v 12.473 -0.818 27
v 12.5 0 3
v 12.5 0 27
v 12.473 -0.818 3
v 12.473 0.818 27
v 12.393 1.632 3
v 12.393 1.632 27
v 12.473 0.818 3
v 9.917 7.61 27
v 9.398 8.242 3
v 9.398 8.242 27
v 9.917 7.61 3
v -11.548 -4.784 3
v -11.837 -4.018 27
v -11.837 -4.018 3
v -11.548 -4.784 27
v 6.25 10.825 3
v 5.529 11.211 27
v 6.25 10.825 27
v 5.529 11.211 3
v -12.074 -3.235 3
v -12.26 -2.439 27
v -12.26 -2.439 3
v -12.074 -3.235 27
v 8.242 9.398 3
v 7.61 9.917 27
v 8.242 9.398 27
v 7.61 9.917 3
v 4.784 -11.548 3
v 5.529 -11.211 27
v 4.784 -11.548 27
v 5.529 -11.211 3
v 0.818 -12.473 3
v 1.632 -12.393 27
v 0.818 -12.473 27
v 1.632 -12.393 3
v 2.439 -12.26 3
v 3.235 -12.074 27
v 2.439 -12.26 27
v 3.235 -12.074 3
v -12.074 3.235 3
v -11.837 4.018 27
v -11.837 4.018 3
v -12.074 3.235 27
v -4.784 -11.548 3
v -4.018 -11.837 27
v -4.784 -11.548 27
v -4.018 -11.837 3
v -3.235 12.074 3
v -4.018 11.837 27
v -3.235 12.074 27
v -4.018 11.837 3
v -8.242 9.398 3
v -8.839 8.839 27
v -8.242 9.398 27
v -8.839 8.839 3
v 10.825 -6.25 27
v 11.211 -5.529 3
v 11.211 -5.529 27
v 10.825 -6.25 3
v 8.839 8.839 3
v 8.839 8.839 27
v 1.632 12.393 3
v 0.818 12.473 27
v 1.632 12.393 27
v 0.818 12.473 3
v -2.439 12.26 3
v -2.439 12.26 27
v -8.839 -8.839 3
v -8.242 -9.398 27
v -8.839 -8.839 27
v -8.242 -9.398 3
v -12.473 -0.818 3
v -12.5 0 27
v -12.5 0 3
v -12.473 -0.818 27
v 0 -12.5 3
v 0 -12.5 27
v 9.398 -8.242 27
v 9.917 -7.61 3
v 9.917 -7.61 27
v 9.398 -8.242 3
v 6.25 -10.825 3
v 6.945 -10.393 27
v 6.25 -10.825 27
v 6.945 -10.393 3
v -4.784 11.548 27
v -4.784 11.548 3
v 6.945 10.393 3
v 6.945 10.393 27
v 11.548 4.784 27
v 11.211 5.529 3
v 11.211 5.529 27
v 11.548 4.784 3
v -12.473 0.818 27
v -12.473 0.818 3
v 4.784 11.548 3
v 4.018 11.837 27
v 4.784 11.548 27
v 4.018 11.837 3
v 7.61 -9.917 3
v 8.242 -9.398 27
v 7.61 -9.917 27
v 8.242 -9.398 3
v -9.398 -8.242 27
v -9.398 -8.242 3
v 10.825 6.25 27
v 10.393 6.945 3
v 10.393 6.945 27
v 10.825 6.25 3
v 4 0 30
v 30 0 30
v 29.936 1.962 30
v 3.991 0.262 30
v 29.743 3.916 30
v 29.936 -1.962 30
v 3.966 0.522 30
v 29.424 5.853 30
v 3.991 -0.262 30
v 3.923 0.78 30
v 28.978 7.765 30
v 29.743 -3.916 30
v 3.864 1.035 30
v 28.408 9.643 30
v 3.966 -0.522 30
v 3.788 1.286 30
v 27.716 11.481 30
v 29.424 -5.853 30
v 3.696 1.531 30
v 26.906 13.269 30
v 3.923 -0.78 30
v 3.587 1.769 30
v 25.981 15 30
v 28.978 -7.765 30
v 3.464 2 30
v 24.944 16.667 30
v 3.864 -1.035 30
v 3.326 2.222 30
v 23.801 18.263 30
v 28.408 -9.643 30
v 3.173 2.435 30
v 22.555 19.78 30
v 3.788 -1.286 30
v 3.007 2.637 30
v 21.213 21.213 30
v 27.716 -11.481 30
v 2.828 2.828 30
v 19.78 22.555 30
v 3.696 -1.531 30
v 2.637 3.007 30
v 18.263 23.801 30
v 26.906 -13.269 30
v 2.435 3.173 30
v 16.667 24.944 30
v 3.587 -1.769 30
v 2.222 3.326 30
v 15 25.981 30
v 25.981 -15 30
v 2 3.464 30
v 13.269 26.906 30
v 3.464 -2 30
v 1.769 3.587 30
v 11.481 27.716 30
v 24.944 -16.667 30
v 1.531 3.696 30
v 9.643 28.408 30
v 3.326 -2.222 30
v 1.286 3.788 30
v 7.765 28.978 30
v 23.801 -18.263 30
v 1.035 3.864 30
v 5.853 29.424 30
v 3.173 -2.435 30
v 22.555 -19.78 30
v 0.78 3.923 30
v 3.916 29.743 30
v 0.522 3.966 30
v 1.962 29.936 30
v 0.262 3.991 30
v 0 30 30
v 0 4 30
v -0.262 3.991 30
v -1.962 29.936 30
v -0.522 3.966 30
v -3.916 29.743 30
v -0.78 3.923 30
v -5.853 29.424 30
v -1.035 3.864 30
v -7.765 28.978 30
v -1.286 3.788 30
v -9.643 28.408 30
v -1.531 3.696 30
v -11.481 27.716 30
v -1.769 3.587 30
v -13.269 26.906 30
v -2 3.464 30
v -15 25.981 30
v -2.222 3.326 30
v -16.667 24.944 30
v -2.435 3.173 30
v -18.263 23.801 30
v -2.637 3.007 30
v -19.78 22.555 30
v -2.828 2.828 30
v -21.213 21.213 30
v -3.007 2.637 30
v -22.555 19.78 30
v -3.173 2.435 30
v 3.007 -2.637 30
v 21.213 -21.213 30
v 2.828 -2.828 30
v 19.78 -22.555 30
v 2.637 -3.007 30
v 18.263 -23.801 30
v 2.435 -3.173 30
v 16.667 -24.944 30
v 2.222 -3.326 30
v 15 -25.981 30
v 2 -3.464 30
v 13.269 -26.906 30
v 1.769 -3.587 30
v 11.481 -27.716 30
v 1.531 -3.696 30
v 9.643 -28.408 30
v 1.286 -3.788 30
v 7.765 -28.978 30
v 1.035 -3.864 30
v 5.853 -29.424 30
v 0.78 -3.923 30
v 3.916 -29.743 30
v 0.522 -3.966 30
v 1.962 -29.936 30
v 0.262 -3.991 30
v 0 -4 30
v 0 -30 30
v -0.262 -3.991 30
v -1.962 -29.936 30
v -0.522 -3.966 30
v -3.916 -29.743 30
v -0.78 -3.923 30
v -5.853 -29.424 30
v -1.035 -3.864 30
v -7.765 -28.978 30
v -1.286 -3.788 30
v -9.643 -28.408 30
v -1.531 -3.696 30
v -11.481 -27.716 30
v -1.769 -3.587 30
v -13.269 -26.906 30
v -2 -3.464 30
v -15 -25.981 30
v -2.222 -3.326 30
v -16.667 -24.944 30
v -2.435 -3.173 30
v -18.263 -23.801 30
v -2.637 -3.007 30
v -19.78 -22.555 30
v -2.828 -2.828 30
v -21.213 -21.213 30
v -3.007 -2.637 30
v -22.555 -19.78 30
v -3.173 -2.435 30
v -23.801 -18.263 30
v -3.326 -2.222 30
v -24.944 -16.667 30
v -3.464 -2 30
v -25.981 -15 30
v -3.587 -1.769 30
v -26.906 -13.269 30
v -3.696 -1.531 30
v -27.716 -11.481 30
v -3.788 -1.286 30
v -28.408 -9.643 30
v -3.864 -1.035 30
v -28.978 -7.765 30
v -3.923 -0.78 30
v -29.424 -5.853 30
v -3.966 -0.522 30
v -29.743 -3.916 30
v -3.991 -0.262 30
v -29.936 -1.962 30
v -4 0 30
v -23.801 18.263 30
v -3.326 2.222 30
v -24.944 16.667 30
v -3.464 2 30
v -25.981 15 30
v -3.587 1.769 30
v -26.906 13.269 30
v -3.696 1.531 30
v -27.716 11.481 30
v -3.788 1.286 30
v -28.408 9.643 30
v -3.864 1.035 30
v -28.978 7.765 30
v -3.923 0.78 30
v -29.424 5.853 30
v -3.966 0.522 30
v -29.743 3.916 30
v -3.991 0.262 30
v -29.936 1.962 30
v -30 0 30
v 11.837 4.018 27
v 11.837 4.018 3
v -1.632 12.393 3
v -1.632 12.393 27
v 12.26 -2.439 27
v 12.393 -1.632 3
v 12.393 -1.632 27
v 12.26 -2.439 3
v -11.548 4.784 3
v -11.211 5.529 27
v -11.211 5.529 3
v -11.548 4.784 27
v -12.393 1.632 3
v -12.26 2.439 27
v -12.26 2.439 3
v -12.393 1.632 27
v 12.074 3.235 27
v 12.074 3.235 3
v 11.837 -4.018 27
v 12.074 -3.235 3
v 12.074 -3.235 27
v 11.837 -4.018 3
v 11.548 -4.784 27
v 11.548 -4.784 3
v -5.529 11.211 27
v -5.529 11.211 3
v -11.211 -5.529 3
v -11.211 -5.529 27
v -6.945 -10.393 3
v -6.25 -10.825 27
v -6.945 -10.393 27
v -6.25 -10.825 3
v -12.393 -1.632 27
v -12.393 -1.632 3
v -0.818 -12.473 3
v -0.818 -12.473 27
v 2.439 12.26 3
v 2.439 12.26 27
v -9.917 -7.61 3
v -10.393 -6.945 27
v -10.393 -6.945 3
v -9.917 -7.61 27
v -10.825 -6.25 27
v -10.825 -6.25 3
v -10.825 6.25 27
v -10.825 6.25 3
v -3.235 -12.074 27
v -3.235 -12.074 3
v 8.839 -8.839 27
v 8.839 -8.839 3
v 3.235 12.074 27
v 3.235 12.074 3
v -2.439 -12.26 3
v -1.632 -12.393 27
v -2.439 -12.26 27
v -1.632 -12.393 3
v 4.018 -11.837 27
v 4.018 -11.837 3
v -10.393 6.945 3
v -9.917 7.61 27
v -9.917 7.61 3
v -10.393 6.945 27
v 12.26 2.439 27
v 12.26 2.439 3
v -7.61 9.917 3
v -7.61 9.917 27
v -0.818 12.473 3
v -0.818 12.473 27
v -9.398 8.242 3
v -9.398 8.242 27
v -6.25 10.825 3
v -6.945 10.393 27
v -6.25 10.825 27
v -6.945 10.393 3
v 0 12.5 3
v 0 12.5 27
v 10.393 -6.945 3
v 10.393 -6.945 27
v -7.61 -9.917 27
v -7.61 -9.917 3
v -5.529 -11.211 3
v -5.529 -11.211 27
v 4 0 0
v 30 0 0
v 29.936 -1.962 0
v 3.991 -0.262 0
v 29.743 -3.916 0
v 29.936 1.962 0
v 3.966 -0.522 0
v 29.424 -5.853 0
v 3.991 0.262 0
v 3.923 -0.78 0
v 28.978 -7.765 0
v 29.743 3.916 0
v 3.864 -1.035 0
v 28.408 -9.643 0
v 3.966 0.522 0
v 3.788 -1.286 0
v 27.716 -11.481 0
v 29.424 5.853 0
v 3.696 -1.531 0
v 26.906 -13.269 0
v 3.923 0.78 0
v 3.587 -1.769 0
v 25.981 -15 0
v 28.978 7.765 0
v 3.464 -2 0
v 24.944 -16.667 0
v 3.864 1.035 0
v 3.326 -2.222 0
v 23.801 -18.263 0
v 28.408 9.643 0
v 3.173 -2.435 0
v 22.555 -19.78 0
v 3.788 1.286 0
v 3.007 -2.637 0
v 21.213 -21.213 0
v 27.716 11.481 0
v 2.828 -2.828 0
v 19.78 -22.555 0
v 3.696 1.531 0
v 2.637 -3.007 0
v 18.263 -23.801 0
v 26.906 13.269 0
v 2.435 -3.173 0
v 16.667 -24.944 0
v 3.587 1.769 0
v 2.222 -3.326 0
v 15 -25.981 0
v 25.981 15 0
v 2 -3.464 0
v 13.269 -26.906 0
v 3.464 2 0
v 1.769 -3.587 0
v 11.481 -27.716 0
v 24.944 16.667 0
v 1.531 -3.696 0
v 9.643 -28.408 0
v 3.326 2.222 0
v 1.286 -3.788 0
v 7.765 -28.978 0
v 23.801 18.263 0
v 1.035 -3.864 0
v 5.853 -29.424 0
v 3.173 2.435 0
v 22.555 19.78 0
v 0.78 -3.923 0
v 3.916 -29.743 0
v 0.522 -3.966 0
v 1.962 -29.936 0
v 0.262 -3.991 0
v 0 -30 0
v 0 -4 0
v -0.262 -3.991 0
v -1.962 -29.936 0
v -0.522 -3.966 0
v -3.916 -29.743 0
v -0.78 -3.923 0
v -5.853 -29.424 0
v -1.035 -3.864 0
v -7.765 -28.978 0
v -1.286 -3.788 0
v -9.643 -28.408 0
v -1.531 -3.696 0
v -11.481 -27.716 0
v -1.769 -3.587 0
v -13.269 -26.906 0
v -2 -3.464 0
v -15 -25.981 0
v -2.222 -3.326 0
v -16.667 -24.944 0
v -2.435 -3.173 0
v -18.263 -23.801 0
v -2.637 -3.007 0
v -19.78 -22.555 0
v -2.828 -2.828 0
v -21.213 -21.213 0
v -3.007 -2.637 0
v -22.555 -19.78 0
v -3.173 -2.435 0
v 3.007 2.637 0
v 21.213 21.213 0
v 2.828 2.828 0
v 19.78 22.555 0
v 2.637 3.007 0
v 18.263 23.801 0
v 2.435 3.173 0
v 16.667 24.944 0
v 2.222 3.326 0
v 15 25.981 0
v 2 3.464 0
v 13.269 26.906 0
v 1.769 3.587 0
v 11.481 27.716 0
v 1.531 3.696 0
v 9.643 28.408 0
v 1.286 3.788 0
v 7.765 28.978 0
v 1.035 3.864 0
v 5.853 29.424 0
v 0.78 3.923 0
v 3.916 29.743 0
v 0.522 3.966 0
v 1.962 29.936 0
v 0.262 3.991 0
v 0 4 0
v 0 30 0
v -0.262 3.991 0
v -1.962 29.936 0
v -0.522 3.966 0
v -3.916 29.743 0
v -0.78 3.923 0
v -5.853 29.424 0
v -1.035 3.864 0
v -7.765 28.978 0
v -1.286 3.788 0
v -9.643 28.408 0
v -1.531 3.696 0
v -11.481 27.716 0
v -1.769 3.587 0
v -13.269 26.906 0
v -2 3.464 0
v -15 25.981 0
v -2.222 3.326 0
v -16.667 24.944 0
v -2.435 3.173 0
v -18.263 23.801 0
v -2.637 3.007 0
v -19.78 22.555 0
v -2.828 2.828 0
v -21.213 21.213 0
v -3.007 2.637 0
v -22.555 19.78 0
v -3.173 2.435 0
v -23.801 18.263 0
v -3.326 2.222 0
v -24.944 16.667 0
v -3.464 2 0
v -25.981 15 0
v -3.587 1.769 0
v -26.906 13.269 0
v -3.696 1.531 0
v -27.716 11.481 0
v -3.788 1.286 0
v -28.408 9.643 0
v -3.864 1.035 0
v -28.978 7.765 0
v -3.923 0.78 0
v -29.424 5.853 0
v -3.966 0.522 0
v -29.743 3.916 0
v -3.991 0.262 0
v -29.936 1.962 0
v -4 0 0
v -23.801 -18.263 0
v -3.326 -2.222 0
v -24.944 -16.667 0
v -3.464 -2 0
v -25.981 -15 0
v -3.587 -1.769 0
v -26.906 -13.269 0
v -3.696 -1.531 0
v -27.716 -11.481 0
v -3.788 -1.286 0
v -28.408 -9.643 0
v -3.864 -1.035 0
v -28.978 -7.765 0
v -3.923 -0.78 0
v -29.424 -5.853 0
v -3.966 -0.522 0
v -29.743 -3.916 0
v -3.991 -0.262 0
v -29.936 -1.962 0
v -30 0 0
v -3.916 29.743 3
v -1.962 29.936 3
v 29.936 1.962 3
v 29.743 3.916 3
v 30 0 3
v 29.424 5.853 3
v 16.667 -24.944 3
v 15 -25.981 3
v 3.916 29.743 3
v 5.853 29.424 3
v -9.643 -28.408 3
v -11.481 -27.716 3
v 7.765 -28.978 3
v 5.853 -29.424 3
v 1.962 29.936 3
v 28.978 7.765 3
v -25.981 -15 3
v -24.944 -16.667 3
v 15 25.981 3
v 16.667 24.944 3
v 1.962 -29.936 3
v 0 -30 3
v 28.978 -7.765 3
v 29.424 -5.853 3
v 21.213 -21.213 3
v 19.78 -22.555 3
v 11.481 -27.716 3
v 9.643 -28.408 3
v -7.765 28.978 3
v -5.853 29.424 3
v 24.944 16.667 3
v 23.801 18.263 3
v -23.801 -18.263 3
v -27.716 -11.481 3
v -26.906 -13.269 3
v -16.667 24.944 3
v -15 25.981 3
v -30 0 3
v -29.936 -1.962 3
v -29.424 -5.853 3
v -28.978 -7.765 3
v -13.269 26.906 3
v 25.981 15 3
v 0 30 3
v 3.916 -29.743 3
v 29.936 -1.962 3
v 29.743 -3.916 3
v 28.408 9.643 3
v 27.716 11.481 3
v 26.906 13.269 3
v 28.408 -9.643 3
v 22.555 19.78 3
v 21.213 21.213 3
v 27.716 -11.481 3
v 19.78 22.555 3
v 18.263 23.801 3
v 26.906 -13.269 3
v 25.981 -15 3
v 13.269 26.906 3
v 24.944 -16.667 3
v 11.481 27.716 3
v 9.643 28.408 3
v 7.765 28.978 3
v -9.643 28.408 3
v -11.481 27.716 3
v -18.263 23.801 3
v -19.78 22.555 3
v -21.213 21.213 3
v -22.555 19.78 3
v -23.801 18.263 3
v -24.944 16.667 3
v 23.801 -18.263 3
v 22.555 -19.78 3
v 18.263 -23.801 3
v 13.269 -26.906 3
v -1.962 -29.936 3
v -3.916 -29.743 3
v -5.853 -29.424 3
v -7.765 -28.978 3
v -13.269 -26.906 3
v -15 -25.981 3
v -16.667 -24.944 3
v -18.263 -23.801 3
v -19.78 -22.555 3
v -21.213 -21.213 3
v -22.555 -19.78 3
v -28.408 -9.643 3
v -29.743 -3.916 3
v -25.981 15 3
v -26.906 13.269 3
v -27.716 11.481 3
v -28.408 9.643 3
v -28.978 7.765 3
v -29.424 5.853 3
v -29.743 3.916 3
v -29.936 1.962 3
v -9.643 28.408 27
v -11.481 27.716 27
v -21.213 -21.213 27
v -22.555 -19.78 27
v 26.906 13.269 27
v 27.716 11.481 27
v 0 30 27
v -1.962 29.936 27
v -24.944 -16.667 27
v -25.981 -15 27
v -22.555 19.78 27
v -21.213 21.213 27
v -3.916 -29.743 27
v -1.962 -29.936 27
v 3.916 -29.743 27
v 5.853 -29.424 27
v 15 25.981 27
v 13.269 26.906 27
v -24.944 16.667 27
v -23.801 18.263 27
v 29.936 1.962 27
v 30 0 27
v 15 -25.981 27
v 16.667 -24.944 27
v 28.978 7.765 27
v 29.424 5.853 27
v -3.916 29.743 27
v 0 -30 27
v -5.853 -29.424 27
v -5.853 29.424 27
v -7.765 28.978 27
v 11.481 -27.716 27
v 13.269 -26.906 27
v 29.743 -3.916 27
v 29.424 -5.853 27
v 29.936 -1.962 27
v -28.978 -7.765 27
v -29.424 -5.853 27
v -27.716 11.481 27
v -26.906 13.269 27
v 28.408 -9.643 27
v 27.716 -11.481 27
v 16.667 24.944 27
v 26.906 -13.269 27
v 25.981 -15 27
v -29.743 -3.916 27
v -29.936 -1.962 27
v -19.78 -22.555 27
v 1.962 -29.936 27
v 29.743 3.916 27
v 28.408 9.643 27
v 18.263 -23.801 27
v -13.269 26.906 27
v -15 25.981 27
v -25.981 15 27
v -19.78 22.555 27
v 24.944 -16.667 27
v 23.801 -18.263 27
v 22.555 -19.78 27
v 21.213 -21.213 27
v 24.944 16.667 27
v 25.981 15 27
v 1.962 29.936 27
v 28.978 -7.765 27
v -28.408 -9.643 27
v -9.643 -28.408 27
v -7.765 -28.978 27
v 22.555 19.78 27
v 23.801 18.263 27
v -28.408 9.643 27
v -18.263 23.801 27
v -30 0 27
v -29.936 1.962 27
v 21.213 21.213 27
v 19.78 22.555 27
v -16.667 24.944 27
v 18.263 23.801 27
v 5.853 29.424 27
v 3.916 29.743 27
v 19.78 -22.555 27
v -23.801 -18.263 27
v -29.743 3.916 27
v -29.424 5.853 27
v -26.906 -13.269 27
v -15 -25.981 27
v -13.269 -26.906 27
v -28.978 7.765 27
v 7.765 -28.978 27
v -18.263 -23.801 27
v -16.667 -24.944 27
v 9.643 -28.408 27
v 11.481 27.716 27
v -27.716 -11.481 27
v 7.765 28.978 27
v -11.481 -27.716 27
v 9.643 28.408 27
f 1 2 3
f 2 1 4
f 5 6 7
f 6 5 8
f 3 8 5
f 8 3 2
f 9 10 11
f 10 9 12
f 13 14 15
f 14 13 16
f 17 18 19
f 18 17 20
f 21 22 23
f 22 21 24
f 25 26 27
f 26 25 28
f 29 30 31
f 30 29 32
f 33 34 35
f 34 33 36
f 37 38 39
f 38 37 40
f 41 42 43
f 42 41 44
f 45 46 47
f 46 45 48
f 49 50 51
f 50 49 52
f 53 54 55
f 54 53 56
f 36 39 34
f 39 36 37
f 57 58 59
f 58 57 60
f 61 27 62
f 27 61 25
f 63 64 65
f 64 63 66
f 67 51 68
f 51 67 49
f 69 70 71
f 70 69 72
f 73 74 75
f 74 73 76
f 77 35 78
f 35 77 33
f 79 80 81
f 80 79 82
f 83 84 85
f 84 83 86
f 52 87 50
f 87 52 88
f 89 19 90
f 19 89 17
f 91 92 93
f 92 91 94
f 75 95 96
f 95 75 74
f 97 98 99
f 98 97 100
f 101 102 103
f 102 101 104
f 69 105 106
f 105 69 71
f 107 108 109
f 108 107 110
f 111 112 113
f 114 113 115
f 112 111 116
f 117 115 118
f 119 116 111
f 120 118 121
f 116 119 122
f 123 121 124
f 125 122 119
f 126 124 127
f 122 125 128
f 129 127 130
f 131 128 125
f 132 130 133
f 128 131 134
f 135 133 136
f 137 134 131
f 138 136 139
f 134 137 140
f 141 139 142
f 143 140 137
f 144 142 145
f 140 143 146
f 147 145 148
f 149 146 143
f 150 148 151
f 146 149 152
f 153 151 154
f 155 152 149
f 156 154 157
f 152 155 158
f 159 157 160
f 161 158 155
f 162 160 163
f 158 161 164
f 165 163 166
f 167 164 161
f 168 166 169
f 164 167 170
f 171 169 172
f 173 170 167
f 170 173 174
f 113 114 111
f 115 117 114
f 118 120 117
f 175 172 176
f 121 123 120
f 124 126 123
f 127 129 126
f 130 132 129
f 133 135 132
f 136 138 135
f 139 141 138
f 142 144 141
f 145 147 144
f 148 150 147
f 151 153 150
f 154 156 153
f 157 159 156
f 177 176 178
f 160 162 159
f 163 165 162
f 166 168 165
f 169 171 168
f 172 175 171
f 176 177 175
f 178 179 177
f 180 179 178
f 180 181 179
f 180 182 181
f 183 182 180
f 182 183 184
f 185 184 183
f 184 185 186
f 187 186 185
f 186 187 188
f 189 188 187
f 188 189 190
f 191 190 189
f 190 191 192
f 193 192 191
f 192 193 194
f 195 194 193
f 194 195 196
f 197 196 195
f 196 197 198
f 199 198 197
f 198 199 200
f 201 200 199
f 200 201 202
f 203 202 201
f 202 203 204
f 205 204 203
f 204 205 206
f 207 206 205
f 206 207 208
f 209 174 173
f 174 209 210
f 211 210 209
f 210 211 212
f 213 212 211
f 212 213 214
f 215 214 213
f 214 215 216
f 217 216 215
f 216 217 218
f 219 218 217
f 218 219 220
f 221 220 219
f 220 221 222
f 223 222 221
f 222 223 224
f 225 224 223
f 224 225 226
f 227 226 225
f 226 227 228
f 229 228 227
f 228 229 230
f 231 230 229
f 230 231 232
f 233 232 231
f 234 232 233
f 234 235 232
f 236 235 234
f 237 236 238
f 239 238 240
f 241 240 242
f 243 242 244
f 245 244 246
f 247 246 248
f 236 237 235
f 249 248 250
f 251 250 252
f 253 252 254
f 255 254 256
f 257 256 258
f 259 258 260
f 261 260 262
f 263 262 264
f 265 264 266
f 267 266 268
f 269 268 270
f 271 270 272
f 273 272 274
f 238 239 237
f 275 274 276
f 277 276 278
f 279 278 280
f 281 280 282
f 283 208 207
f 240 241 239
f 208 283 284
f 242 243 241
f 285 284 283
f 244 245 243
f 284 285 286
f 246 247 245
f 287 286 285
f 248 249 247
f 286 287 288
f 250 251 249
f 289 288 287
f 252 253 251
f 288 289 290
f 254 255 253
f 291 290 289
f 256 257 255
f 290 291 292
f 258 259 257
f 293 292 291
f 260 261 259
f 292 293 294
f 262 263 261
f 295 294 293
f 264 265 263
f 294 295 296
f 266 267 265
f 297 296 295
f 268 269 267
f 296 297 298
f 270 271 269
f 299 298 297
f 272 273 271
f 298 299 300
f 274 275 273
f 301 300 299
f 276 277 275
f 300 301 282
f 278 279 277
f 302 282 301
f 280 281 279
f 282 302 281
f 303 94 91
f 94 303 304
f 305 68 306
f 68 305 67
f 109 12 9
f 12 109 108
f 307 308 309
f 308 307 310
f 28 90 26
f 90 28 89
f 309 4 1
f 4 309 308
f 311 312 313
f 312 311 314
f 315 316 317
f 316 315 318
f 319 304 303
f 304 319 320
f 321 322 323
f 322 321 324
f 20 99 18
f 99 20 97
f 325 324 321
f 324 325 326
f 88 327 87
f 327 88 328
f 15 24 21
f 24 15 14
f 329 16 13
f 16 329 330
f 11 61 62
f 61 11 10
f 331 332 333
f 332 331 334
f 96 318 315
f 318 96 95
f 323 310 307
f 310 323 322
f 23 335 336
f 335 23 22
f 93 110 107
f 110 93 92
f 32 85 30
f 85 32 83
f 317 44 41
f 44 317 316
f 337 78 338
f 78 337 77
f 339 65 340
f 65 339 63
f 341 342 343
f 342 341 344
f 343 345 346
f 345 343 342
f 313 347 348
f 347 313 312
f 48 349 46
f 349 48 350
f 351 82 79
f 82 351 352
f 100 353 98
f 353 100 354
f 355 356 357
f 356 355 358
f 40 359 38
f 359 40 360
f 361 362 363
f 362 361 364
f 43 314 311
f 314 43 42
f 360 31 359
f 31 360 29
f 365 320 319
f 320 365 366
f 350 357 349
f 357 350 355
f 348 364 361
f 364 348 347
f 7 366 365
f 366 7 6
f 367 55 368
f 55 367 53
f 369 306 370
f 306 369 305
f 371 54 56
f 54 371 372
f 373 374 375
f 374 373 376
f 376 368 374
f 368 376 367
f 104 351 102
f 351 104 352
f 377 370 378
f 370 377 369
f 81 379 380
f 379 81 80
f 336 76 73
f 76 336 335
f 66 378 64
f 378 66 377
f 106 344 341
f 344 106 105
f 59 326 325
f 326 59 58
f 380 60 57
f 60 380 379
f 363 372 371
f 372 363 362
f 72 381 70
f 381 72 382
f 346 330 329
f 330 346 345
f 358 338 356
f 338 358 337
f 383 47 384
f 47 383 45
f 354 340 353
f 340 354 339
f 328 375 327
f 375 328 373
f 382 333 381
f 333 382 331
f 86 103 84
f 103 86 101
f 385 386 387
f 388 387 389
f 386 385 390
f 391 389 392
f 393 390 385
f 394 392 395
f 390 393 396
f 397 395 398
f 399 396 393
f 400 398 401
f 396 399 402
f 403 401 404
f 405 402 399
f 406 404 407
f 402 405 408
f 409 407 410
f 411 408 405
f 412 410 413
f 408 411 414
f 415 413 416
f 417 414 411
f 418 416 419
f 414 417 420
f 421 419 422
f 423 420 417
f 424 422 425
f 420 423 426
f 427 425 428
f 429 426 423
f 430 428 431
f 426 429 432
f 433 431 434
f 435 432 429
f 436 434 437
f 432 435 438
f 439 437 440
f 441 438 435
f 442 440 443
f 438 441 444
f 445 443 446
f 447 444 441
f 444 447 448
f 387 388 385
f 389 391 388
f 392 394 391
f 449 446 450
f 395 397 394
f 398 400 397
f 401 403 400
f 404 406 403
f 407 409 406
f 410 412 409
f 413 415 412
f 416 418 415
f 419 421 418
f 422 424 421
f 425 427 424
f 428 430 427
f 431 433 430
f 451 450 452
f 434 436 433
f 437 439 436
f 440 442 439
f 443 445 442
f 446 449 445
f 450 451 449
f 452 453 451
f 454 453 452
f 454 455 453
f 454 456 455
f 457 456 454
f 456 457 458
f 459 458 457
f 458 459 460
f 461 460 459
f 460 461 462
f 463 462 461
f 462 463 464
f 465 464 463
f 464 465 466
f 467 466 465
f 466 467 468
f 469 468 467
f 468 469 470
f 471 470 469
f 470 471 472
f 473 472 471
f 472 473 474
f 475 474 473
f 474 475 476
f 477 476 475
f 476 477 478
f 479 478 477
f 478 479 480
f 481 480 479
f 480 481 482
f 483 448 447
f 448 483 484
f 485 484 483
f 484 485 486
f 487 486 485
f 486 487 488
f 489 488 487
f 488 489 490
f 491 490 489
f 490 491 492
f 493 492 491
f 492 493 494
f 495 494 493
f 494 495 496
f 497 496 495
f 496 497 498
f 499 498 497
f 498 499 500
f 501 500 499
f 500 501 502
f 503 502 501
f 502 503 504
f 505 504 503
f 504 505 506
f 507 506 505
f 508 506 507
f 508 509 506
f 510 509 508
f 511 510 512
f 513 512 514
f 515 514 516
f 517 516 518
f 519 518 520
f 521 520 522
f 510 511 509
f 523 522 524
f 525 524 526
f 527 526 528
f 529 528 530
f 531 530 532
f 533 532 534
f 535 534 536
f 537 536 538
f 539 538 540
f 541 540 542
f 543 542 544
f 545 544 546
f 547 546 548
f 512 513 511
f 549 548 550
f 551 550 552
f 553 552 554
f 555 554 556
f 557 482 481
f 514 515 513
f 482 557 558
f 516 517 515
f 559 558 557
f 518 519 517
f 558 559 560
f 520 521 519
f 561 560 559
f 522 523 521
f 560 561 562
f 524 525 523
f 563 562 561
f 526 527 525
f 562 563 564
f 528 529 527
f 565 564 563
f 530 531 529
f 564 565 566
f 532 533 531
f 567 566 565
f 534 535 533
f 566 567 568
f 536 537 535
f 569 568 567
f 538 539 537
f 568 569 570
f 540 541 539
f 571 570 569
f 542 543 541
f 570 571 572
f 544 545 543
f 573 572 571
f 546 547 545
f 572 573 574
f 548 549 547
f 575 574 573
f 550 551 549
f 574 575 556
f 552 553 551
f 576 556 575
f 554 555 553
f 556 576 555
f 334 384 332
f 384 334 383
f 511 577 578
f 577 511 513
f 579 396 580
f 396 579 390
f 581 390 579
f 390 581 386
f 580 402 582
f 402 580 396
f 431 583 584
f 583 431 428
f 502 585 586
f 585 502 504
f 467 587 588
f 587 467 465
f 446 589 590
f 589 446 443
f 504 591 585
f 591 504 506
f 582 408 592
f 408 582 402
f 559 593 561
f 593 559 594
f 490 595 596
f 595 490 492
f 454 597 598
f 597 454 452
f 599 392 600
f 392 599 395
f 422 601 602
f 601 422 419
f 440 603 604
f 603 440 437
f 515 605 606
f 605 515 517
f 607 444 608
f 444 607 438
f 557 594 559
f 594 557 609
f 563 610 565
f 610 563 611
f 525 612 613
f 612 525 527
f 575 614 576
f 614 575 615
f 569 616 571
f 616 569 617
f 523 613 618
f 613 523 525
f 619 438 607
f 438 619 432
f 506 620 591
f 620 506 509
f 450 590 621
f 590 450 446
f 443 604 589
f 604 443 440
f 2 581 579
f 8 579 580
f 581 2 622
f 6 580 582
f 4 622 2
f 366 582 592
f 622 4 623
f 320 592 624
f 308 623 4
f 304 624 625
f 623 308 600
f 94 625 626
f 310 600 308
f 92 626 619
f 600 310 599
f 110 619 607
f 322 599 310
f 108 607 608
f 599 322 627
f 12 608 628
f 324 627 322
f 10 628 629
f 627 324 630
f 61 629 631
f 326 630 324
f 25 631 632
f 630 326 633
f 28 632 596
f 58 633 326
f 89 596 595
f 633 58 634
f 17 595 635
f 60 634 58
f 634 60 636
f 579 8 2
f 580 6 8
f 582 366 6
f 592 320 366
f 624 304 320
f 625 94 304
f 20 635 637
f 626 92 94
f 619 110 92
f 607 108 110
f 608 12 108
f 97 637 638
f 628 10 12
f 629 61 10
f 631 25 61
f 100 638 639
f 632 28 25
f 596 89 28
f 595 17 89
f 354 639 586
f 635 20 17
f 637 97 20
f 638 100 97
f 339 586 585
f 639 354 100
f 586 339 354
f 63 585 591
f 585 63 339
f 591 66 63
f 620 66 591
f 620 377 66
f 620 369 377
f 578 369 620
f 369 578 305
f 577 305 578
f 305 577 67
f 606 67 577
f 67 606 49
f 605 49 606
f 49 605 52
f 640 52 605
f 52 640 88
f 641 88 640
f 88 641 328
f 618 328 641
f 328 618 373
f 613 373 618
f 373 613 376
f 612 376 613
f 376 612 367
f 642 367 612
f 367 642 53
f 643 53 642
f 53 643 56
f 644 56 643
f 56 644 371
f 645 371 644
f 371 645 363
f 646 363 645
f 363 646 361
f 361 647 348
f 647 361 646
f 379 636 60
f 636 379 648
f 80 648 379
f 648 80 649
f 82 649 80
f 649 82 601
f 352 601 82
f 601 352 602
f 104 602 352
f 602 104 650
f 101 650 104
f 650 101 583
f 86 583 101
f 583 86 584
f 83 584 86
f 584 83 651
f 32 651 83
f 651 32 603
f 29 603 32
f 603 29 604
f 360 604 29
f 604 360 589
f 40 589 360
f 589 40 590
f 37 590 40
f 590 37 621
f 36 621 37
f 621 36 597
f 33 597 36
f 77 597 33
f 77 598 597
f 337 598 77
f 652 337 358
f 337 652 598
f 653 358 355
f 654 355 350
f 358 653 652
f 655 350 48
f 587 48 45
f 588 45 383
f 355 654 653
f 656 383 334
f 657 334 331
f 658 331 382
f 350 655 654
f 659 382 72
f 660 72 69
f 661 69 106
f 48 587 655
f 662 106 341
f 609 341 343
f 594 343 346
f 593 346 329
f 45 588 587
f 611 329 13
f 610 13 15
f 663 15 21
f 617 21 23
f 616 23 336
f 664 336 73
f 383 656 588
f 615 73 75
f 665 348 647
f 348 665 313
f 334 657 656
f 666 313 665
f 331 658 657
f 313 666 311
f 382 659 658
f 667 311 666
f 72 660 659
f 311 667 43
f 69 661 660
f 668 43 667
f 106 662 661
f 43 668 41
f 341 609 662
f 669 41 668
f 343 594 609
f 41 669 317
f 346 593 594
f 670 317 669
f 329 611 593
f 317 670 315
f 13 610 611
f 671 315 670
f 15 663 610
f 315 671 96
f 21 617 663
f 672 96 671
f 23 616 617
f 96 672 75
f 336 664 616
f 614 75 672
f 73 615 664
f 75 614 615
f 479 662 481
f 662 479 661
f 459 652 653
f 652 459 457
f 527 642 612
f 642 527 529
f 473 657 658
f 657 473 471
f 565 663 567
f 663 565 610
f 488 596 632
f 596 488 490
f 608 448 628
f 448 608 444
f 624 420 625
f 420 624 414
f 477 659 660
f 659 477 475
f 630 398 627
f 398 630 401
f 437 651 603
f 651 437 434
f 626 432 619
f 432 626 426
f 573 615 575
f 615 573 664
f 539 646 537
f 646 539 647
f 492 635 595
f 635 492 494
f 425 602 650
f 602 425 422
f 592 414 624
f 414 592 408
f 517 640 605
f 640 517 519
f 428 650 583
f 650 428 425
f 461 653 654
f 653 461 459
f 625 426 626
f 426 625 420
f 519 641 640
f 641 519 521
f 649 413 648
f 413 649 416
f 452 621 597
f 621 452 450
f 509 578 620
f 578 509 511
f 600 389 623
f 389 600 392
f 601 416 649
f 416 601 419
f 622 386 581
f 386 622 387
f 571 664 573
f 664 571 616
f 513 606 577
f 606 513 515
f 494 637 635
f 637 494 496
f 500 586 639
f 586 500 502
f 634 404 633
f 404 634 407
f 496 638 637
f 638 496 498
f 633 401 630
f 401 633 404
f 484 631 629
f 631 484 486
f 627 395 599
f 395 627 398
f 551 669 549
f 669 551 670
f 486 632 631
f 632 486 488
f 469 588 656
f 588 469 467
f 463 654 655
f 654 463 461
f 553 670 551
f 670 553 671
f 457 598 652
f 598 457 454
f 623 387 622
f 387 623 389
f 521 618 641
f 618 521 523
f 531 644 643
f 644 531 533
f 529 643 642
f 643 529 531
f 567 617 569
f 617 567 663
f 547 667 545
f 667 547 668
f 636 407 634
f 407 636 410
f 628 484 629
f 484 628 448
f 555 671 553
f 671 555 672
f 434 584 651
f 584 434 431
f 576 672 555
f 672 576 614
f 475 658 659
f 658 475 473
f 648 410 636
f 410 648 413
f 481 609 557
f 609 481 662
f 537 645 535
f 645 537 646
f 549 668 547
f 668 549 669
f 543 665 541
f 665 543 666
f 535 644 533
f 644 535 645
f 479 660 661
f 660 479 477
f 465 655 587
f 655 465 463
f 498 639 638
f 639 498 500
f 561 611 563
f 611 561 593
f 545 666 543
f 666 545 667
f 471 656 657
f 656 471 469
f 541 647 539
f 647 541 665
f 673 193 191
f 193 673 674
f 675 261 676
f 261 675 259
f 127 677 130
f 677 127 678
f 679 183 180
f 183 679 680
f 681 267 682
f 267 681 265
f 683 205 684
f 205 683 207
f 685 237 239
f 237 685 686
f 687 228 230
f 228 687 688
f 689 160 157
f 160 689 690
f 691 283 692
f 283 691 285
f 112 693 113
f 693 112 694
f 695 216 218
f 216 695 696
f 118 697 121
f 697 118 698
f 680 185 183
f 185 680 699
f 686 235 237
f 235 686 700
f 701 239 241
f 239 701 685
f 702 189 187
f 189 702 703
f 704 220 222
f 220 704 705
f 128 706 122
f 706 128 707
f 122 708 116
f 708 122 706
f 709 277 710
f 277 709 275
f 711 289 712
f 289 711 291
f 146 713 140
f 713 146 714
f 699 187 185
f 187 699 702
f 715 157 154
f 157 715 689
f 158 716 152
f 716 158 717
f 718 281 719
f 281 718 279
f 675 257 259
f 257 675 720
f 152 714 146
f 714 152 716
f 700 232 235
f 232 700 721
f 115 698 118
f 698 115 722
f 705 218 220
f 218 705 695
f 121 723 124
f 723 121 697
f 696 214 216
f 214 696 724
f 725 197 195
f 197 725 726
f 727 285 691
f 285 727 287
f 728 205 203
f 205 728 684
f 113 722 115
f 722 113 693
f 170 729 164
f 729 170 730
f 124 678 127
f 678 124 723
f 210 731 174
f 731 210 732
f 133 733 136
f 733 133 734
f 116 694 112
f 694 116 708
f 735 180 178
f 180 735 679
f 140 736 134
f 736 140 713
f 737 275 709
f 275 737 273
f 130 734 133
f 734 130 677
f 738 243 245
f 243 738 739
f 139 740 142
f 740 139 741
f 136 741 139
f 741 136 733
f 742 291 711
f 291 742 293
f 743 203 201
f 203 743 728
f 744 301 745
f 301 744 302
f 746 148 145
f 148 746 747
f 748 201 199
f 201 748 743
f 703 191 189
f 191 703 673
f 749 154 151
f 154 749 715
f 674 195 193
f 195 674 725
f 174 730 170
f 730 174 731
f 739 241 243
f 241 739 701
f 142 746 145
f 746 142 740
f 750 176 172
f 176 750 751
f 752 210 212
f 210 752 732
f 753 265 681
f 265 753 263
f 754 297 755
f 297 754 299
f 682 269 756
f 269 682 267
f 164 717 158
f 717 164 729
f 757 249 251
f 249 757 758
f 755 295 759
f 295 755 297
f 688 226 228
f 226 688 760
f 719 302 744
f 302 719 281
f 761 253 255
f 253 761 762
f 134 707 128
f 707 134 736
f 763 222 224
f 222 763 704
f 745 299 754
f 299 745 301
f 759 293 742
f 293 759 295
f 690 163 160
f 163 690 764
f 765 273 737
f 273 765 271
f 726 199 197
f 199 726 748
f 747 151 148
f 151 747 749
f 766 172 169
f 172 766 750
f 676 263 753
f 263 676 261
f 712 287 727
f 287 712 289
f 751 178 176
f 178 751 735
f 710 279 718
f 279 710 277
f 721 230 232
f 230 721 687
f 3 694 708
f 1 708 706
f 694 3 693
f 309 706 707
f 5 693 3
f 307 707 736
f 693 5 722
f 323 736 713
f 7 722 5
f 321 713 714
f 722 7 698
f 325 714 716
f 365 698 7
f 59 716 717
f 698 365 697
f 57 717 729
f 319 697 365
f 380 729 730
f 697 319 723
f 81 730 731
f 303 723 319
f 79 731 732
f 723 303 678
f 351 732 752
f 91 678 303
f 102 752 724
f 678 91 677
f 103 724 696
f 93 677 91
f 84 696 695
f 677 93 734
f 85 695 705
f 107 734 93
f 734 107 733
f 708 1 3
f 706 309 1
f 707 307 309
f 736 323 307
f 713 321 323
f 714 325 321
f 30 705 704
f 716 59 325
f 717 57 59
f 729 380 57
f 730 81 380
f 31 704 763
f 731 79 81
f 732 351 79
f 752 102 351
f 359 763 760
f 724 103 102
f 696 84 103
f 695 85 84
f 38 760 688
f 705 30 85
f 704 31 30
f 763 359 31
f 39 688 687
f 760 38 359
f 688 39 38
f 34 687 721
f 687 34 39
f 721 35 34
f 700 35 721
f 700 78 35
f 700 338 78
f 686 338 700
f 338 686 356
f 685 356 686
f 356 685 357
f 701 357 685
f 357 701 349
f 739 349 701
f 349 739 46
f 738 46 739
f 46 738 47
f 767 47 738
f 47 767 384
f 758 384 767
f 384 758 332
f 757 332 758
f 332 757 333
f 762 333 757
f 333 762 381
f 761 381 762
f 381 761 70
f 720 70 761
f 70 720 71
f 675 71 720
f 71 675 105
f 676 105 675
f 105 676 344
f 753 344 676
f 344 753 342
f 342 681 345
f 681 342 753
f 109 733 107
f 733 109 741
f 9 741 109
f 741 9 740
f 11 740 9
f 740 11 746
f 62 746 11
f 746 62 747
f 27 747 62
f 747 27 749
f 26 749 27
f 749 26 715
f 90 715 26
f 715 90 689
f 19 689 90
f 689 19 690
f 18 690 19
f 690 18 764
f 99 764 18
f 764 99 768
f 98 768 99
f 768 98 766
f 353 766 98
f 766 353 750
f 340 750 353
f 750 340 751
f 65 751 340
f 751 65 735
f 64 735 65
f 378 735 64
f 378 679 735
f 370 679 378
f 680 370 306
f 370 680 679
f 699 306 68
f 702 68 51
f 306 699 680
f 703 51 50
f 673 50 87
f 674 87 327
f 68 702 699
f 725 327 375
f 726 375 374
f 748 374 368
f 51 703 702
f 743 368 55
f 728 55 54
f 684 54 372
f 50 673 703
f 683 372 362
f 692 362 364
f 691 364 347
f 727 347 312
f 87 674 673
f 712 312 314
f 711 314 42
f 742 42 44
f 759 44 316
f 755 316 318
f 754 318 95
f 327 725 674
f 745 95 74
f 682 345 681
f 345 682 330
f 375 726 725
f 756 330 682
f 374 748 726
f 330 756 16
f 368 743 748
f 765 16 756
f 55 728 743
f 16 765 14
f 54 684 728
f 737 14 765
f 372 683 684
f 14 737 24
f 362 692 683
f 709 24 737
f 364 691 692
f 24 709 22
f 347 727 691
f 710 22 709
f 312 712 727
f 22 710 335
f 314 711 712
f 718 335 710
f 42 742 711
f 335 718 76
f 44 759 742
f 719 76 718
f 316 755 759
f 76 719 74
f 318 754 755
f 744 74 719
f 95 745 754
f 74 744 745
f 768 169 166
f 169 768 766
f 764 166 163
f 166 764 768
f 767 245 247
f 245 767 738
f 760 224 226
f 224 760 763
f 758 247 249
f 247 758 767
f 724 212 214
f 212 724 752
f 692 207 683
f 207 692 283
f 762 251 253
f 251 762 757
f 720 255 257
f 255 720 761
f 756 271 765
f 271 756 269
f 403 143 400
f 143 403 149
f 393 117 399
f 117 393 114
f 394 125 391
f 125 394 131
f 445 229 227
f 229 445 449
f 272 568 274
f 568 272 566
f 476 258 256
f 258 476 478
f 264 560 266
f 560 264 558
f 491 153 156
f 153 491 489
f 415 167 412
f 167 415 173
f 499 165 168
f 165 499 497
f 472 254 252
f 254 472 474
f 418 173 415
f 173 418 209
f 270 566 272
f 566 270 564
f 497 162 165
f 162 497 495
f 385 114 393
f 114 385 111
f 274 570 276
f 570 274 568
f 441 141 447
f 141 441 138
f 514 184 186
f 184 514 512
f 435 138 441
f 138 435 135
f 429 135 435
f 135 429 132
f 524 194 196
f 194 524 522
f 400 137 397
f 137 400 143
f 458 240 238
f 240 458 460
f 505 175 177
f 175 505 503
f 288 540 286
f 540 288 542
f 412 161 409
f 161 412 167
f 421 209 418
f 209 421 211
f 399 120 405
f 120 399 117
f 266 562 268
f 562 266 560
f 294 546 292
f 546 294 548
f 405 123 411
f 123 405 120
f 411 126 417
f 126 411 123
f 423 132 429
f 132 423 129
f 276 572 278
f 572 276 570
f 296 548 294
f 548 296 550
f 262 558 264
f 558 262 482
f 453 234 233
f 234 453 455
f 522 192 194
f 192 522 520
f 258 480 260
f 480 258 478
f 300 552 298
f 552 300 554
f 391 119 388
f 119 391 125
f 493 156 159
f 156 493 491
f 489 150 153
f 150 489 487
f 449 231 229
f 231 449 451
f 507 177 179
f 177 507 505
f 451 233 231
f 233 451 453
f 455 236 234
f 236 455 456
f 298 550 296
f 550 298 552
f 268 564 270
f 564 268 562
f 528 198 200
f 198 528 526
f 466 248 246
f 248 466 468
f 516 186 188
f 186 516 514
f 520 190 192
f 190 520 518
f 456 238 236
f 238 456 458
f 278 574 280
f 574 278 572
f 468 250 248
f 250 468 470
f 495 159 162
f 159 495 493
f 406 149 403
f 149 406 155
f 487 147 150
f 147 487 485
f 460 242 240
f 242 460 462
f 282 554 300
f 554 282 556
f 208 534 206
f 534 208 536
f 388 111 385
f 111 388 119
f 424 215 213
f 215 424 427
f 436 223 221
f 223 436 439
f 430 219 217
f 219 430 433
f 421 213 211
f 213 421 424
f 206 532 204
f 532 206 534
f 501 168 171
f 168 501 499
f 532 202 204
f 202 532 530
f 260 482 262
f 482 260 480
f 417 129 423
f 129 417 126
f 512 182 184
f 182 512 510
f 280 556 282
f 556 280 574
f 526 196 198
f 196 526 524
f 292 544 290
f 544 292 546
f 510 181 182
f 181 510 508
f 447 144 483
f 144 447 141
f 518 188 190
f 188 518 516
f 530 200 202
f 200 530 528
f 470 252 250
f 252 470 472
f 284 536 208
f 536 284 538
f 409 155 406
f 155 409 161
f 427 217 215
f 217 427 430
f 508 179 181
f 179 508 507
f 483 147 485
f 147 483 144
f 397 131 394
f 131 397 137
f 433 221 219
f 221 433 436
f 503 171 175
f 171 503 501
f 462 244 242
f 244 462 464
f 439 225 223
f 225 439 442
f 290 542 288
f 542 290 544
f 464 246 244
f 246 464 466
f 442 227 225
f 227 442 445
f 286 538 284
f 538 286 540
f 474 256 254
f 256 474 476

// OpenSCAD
// Spool for cord, wire or filament - a core between two flanges with an axial bore.
// NOVEL general part.
//
// @desc spool for cord, wire or filament
// @prompt Design a spool in OpenSCAD: a {core_d} mm core {width} mm wide between two {flange_d} mm flanges, with a {bore} mm axial bore. Reply with a single complete OpenSCAD file.
// @param core_d   core diameter, mm          [12:60]
// @param flange_d flange diameter, mm        [25:120]
// @param width    width between flanges, mm  [10:60]
// @param bore     axial bore, mm             [4:30]

core_d   = 25;
flange_d = 60;
width    = 30;
bore     = 8;

$fn = 96;

flange_t = 3;

difference() {
    union() {
        cylinder(h = width, d = core_d);
        cylinder(h = flange_t, d = flange_d);
        translate([0, 0, width - flange_t]) cylinder(h = flange_t, d = flange_d);
    }
    translate([0, 0, -1]) cylinder(h = width + 2, d = bore);
}
